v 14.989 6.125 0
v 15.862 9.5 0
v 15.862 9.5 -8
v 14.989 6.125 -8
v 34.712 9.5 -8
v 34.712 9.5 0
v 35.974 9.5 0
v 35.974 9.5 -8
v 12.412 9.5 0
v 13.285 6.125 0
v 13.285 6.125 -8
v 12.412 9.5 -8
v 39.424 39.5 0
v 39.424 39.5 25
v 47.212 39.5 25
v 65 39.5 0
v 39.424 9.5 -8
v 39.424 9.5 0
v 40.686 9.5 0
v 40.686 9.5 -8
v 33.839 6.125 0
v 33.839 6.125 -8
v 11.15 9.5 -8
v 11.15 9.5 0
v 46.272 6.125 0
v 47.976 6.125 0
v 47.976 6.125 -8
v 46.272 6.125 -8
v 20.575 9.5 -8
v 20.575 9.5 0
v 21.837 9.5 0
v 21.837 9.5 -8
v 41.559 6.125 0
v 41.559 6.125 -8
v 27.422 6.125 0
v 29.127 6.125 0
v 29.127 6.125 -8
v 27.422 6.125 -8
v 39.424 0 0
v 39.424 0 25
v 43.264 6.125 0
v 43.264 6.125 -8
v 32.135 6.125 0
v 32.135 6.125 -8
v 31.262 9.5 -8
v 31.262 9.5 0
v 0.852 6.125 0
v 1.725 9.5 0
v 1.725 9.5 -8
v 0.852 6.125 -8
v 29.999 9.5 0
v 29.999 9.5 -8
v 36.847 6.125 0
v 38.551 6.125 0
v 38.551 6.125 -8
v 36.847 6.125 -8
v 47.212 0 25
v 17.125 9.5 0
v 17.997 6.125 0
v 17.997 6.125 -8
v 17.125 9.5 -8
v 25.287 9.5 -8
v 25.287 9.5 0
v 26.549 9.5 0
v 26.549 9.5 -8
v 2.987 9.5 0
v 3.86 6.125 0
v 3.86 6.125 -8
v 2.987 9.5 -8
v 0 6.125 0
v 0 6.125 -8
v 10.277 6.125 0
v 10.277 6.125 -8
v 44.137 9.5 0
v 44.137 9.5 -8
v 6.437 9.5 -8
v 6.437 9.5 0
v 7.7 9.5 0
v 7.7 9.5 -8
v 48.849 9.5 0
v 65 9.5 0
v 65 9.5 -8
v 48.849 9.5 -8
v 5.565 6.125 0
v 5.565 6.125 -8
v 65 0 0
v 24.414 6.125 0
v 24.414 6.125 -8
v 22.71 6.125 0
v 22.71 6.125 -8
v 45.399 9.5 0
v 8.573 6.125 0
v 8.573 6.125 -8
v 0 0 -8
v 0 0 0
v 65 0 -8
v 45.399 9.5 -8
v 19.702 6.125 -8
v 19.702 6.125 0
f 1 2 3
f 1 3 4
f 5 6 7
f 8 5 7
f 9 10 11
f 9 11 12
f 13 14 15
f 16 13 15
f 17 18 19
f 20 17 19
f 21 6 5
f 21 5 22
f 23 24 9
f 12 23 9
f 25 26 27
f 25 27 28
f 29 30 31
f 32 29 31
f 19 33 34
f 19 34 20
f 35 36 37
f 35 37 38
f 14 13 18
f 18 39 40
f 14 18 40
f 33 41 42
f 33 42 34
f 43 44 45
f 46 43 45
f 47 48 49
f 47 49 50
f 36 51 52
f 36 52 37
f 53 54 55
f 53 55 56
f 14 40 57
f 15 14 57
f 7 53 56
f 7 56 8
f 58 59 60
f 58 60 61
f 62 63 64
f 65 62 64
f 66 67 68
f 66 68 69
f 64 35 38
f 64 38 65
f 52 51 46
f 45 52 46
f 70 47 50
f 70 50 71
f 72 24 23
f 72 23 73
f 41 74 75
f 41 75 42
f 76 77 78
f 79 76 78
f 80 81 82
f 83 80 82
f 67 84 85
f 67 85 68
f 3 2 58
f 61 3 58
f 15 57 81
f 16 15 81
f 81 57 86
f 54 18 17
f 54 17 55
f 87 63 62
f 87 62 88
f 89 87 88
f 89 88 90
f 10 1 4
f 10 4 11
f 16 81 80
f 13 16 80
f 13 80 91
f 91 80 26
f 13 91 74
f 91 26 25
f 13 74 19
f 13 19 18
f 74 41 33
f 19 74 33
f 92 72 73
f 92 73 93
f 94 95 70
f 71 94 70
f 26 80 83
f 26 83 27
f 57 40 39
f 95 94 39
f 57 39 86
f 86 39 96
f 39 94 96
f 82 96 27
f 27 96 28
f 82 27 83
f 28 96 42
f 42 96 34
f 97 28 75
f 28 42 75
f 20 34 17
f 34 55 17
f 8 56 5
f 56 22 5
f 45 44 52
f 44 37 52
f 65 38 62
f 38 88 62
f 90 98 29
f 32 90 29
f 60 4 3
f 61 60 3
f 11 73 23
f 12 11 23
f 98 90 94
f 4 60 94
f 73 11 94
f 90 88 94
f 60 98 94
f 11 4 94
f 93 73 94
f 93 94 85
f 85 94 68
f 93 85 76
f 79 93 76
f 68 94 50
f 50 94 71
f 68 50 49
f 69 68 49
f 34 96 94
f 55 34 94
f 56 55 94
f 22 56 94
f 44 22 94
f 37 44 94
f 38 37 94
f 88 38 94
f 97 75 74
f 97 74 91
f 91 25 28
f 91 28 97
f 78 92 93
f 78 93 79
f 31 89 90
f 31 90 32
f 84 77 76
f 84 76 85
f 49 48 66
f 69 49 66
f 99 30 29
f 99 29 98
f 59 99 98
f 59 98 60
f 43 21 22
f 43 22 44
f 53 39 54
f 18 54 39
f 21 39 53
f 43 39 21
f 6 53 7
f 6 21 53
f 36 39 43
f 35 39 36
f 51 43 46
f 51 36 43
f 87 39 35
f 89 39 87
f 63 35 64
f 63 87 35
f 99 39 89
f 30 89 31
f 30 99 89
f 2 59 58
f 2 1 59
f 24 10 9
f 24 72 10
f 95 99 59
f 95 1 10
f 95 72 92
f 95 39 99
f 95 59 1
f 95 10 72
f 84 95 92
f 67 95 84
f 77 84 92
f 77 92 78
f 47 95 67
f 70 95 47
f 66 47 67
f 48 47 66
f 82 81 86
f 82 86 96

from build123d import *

# Parameters (mm, degrees)
BLANKSKE_W          = 50
BLANKSKE_H          = 9.5
BLANK_DEPTH         = 8
TOOTHCUTSIM_DEPTH   = 52.519413817
TEETHCUTS_COUNT     = 11
TEETHCUTS_PITCH     = 4.712388975
SKETCH3_W           = 8
SKETCH3_H           = 9.5
BOSS_EXTRUDE2_DEPTH = 15
BOSS_EXTRUDE5_DEPTH = 39.5


with BuildPart() as part:
    # BlankSke → Blank (new body)
    with BuildSketch(Plane.XY):
        with Locations((25, 4.75)):
            Rectangle(BLANKSKE_W, BLANKSKE_H)
    extrude(amount=-BLANK_DEPTH)

    # TooCutSkeSim → ToothCutSim (cut, through all)
    with BuildSketch(Plane.XY):
        Polygon((0.852189273, 6.125), (-0.852189273, 6.125), (-1.731592507, 9.5254), (1.731592507, 9.5254), align=None)
    toothcutsim = extrude(amount=-TOOTHCUTSIM_DEPTH, mode=Mode.SUBTRACT)

    # TeethCuts: ToothCutSim ×11
    with Locations(*[(i * TEETHCUTS_PITCH, 0, 0) for i in range(1, TEETHCUTS_COUNT)]):
        add(toothcutsim, mode=Mode.SUBTRACT)

    # Sketch3 → Boss-Extrude2 (add)
    with BuildSketch(Plane(origin=(50, 0, 0), x_dir=(0, 0, -1), z_dir=(1, 0, 0))):
        with Locations((4, 4.75)):
            Rectangle(SKETCH3_W, SKETCH3_H)
    extrude(amount=BOSS_EXTRUDE2_DEPTH)

    # Sketch7 → Boss-Extrude5 (add)
    with BuildSketch(Plane(origin=(0, 0, 0), x_dir=(1, 0, 0), z_dir=(0, 1, 0))):
        Polygon((65, 0), (39.42413542, 0), (39.42413542, -25), (47.21206771, -25), align=None)
    extrude(amount=BOSS_EXTRUDE5_DEPTH)


solid = part.part
